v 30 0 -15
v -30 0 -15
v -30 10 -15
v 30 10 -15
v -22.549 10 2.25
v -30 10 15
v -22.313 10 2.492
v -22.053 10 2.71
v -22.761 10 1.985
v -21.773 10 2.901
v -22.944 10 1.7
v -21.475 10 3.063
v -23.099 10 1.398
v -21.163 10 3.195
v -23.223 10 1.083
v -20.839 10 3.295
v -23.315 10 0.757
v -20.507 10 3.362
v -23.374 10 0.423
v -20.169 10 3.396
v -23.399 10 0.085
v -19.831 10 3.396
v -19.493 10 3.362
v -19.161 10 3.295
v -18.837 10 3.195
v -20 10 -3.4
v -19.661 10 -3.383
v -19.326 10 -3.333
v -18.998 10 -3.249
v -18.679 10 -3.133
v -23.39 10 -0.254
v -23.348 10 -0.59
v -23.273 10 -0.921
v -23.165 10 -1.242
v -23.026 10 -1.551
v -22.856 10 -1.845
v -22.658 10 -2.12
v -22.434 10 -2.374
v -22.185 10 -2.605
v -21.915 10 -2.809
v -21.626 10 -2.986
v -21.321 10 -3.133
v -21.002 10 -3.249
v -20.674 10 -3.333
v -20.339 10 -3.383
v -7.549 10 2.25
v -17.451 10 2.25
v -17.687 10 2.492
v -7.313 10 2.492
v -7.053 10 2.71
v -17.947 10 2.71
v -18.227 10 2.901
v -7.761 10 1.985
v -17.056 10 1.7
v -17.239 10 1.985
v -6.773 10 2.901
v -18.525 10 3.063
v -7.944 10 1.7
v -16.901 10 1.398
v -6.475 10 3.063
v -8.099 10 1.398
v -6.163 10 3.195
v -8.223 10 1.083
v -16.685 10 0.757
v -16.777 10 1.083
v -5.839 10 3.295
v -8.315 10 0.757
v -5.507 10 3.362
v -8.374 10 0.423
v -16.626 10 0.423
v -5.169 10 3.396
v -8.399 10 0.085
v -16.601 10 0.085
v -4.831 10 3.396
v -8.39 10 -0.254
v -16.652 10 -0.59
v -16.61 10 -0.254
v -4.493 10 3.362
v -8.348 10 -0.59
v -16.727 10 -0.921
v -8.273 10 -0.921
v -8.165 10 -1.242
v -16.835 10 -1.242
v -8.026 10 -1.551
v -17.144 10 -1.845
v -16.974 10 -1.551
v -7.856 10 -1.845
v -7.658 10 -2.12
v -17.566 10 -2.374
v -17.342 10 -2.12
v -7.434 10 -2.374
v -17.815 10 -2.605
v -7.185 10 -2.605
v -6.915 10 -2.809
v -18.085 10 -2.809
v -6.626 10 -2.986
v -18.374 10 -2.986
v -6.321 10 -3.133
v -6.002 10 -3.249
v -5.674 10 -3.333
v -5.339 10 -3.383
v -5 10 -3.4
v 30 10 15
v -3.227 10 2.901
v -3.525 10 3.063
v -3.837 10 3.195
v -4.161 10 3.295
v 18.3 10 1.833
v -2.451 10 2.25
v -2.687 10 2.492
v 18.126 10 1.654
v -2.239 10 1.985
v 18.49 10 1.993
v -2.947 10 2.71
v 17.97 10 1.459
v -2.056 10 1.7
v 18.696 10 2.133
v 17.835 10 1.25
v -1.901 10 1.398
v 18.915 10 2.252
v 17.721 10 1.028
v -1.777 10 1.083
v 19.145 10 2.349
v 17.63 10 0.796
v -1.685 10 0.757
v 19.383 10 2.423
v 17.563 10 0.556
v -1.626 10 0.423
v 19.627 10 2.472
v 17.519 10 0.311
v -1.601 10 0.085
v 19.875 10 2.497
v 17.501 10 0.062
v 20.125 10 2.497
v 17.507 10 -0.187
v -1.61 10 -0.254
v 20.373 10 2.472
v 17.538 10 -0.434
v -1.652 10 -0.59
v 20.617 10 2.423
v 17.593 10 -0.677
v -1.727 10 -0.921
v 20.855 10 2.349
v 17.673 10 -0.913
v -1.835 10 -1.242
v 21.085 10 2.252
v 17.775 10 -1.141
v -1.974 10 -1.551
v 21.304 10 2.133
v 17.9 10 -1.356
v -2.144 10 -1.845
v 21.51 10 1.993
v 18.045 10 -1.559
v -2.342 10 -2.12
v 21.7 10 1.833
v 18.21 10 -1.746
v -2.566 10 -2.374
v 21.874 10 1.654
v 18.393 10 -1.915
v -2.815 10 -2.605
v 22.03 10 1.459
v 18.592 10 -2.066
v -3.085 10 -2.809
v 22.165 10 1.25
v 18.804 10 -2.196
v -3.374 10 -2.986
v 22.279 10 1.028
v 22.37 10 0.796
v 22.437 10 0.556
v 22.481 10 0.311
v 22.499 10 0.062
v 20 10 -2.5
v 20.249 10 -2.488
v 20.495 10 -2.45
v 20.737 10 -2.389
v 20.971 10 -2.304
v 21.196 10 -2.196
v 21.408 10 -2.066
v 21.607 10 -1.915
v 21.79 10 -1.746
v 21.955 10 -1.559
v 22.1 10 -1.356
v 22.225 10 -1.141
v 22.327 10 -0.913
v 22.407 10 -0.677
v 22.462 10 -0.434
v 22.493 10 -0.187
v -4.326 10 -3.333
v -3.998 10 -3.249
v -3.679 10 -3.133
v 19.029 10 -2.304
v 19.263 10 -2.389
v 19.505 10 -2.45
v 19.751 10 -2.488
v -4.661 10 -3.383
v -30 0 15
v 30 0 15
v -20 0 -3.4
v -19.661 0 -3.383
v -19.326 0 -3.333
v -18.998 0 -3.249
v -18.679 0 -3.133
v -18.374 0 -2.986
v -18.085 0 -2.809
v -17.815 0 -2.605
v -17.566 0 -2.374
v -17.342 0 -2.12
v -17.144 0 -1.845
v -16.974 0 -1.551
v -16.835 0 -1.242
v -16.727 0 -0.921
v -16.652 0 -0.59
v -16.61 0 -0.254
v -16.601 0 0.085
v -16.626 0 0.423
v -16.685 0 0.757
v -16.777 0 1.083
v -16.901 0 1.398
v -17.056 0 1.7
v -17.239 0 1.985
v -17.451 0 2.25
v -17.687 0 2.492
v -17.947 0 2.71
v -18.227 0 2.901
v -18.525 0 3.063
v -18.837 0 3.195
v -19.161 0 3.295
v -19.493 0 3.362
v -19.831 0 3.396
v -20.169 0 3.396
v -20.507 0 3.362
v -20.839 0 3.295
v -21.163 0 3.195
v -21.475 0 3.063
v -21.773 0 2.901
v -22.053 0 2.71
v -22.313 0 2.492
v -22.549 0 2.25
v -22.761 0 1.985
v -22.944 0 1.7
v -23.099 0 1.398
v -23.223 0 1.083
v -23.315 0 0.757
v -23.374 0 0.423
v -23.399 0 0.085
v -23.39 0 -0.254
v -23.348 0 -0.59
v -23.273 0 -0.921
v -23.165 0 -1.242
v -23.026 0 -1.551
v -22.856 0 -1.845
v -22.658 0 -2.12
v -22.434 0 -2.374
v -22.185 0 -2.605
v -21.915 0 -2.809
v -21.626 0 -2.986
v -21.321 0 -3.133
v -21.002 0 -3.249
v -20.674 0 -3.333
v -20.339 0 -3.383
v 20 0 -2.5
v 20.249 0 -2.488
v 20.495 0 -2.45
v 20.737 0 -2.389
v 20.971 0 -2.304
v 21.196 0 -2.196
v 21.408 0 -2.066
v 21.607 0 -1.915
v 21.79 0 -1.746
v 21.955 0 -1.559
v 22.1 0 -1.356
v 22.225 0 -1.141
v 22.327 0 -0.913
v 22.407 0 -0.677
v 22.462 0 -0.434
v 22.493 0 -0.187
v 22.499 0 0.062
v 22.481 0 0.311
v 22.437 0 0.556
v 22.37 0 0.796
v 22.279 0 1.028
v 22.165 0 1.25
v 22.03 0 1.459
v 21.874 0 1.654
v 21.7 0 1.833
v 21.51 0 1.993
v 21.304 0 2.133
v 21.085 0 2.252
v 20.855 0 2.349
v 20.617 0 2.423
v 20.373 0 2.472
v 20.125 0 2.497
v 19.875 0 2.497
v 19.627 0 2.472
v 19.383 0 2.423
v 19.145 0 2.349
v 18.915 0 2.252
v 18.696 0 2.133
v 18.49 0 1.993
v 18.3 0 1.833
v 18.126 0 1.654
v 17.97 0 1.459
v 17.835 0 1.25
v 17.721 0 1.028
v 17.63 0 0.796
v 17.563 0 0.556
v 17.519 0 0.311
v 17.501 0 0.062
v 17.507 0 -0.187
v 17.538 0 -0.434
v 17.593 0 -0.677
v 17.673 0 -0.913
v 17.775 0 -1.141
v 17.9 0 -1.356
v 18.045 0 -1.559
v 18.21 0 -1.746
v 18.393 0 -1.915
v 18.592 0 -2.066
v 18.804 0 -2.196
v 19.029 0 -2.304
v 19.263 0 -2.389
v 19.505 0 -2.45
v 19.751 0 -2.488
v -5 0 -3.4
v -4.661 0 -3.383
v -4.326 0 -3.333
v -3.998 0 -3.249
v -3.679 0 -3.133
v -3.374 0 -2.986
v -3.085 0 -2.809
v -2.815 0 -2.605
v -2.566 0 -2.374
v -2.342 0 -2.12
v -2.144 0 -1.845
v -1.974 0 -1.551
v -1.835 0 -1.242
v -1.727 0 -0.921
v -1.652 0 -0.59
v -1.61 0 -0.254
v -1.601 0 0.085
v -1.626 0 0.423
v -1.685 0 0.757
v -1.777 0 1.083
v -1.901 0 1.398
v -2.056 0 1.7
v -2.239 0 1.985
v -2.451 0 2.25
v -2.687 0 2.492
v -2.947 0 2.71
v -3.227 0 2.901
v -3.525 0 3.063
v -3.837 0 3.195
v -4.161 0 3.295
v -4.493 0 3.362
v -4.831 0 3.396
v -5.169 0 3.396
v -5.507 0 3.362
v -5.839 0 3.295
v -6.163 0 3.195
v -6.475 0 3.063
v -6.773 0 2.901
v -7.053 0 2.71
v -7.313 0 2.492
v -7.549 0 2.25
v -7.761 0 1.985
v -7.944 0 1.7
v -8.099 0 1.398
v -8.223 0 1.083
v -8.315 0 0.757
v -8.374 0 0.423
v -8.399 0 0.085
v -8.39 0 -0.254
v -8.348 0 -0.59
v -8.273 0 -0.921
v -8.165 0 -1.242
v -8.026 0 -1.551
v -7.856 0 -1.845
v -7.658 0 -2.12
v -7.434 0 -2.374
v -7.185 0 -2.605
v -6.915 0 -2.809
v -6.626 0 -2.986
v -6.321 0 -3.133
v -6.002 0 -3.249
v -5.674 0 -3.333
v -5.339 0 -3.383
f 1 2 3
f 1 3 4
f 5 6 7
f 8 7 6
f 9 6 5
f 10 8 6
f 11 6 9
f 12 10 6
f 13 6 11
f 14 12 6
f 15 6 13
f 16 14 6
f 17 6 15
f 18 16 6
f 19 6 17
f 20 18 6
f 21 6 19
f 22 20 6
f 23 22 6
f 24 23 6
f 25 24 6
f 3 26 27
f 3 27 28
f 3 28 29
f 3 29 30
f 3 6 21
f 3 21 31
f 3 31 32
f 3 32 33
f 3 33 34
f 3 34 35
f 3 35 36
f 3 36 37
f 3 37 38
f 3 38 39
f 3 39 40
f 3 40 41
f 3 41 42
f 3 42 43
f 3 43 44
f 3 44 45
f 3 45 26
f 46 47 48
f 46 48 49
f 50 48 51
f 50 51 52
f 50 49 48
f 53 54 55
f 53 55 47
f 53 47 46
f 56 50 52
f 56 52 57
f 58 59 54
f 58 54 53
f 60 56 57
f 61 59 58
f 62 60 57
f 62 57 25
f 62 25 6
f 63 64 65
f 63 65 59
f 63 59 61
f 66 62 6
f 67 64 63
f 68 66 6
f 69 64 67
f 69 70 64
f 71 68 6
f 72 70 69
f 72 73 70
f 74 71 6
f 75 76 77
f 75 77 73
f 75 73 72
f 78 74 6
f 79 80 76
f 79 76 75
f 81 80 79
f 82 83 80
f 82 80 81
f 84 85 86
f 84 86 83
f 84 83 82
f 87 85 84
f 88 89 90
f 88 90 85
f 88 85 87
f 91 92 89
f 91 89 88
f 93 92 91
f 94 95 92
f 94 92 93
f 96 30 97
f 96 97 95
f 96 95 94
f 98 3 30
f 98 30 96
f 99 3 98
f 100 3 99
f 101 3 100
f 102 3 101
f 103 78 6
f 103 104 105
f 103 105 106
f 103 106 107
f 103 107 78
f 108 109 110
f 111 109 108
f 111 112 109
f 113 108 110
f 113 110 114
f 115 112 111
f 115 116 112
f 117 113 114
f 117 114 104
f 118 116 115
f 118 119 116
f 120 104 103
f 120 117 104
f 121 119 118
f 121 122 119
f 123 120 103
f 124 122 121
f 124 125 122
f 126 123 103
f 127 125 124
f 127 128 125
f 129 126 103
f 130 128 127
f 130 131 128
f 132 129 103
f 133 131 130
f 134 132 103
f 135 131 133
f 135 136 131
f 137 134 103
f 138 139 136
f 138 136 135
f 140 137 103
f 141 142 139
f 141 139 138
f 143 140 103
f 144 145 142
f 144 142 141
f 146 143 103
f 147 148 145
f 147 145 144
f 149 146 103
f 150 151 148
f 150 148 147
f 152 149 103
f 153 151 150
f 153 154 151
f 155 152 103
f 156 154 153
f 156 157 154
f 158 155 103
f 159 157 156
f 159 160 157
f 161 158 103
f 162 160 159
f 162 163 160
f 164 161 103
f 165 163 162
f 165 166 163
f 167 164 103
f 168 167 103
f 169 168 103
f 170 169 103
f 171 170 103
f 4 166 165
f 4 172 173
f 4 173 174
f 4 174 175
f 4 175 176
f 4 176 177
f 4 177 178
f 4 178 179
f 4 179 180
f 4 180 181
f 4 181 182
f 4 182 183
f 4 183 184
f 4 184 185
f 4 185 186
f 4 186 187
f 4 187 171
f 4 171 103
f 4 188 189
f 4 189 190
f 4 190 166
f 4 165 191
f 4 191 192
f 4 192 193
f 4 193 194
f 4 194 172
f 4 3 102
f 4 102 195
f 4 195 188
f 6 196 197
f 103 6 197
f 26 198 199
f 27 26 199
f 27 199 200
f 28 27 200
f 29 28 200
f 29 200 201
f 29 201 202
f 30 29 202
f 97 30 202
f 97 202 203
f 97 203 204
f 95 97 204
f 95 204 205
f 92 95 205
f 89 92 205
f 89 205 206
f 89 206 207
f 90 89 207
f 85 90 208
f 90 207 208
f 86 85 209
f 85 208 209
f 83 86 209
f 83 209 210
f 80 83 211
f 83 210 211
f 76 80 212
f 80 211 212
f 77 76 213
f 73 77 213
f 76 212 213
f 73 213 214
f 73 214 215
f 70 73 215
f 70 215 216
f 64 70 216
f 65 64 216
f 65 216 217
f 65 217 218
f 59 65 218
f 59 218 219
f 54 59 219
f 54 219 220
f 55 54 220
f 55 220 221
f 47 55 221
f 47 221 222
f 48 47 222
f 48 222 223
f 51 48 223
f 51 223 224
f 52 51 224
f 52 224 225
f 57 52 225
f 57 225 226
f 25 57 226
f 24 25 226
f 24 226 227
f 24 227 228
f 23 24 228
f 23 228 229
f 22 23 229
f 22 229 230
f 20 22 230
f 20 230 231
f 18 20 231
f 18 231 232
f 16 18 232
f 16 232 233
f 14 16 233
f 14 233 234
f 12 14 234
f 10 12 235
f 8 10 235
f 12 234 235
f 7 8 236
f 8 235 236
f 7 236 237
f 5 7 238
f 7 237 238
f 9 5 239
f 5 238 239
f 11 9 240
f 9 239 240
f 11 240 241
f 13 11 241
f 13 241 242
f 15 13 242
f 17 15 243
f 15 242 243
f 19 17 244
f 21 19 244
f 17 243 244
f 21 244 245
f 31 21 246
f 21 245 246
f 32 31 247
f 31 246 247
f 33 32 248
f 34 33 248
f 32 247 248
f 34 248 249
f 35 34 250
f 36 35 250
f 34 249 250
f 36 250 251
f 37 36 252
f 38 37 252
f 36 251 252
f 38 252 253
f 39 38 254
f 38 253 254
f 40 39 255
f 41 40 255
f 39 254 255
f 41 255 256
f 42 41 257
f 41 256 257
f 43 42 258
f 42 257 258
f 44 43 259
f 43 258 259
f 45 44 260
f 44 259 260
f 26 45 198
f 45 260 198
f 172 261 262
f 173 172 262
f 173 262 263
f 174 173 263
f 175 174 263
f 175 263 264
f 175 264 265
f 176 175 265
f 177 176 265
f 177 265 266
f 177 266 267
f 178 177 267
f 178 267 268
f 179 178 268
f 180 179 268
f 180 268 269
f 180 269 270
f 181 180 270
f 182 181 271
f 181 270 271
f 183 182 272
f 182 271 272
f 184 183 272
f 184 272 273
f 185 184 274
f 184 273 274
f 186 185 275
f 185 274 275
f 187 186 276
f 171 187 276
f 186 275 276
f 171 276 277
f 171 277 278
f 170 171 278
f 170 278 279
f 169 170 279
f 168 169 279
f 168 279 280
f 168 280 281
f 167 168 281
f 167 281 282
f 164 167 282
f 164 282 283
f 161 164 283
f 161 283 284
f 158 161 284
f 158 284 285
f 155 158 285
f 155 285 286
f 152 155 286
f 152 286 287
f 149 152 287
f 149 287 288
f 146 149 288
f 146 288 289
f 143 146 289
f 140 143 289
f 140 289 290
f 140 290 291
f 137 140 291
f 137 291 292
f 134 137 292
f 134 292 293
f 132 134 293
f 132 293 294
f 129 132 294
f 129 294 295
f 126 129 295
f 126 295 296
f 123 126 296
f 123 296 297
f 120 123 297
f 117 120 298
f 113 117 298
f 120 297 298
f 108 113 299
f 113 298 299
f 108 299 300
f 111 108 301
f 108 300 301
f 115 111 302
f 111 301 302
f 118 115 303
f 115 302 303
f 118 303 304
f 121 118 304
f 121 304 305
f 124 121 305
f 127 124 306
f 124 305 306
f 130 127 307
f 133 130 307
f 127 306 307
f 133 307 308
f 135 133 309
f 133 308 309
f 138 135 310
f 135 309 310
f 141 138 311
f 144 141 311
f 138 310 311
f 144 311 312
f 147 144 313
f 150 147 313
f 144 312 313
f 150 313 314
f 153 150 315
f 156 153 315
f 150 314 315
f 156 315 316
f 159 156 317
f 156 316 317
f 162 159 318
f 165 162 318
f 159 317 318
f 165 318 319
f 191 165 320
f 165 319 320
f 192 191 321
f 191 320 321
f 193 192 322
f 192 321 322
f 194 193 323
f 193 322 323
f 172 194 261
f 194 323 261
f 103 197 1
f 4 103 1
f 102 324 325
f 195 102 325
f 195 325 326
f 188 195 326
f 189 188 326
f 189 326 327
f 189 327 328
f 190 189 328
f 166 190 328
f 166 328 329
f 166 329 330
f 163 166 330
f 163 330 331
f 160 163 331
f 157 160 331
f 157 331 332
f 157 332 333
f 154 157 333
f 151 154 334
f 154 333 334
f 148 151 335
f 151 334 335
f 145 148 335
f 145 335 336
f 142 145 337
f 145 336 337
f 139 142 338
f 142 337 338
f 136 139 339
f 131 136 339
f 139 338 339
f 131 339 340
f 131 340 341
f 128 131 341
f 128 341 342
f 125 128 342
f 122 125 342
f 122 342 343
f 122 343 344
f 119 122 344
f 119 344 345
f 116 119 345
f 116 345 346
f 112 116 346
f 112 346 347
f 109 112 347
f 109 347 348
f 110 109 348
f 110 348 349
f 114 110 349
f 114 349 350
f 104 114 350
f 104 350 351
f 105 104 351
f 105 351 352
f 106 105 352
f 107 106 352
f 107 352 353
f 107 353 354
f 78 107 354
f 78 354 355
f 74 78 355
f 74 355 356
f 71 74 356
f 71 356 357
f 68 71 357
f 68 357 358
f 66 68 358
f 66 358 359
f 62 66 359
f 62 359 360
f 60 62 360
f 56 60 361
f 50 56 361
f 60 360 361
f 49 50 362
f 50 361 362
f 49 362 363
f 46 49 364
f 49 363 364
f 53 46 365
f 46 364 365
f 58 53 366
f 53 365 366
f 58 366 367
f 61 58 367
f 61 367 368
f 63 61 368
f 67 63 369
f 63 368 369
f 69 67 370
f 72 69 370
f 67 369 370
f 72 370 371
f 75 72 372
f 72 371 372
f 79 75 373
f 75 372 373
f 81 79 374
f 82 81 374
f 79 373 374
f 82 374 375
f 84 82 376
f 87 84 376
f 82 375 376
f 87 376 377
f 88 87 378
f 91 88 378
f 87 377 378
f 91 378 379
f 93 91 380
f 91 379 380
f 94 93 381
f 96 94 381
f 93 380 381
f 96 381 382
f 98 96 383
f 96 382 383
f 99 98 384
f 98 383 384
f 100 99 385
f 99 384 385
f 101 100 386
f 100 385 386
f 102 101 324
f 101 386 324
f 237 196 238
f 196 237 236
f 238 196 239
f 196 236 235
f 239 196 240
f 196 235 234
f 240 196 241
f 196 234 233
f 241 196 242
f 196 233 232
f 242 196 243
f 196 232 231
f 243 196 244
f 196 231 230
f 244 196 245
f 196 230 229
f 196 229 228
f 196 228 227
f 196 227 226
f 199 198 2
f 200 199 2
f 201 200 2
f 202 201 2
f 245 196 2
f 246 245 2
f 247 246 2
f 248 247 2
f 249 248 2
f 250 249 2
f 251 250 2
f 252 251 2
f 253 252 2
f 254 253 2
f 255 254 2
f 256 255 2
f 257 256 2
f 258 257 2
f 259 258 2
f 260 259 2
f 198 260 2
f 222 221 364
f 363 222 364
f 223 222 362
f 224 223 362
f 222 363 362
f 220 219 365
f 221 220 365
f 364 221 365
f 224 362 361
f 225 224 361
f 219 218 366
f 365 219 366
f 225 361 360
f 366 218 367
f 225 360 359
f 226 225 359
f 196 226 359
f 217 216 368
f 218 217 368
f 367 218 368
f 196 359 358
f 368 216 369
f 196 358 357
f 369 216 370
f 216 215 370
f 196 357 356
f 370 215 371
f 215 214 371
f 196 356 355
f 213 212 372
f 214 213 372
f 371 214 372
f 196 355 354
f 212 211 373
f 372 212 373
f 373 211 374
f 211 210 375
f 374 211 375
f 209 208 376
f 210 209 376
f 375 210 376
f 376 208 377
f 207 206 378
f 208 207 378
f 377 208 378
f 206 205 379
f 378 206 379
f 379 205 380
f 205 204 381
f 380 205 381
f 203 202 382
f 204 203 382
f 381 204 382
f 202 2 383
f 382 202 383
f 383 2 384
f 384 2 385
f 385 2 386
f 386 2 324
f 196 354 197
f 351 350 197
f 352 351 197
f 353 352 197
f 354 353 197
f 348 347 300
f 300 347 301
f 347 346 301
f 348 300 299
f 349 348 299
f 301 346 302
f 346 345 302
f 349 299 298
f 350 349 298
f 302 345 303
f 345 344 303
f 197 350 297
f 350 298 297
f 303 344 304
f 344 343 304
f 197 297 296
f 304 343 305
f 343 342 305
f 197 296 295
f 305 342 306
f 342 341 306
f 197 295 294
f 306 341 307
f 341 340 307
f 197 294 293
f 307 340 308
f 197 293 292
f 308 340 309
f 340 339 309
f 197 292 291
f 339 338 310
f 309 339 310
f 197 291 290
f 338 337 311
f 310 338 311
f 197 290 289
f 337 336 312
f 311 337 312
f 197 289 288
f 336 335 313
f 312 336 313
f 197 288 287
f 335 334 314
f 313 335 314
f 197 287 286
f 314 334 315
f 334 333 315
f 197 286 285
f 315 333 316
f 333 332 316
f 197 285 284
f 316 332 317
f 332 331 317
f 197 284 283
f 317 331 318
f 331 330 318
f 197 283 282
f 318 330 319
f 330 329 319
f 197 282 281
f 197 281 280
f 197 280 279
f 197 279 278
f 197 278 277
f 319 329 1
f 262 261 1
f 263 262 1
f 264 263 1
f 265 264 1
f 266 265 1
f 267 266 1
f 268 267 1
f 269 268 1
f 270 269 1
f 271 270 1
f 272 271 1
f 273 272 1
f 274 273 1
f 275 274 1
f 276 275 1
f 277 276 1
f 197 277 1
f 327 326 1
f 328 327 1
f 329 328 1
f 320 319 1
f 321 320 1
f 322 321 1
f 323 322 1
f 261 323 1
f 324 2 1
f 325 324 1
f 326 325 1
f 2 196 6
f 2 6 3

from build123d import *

# Parameters (mm, degrees)
SKETCH_1_W         = 60
SKETCH_1_H         = 30
EXTRUDE_1_DEPTH    = 10
MM_1_D             = 6.8
HOLE_WIZARD_M6_1_D = 5


with BuildPart() as part:
    # 草图1 → 凸台-拉伸1 (new body)
    with BuildSketch(Plane(origin=(0, 0, 0), x_dir=(1, 0, 0), z_dir=(0, 1, 0))):
        Rectangle(SKETCH_1_W, SKETCH_1_H)
    extrude(amount=EXTRUDE_1_DEPTH)

    # 大小mm 暗销孔1 (through all)
    with Locations(Plane(origin=(-20, 10, 0), x_dir=(0, 0, 1), z_dir=(0, 1, 0))):
        with Locations((0, 0), (0, 15)):
            Hole(MM_1_D / 2)

    # M6 螺纹孔1 (through all)
    with Locations(Plane(origin=(20, 10, 0), x_dir=(0, 0, 1), z_dir=(0, 1, 0))):
        with Locations((0, 0)):
            Hole(HOLE_WIZARD_M6_1_D / 2)


solid = part.part
